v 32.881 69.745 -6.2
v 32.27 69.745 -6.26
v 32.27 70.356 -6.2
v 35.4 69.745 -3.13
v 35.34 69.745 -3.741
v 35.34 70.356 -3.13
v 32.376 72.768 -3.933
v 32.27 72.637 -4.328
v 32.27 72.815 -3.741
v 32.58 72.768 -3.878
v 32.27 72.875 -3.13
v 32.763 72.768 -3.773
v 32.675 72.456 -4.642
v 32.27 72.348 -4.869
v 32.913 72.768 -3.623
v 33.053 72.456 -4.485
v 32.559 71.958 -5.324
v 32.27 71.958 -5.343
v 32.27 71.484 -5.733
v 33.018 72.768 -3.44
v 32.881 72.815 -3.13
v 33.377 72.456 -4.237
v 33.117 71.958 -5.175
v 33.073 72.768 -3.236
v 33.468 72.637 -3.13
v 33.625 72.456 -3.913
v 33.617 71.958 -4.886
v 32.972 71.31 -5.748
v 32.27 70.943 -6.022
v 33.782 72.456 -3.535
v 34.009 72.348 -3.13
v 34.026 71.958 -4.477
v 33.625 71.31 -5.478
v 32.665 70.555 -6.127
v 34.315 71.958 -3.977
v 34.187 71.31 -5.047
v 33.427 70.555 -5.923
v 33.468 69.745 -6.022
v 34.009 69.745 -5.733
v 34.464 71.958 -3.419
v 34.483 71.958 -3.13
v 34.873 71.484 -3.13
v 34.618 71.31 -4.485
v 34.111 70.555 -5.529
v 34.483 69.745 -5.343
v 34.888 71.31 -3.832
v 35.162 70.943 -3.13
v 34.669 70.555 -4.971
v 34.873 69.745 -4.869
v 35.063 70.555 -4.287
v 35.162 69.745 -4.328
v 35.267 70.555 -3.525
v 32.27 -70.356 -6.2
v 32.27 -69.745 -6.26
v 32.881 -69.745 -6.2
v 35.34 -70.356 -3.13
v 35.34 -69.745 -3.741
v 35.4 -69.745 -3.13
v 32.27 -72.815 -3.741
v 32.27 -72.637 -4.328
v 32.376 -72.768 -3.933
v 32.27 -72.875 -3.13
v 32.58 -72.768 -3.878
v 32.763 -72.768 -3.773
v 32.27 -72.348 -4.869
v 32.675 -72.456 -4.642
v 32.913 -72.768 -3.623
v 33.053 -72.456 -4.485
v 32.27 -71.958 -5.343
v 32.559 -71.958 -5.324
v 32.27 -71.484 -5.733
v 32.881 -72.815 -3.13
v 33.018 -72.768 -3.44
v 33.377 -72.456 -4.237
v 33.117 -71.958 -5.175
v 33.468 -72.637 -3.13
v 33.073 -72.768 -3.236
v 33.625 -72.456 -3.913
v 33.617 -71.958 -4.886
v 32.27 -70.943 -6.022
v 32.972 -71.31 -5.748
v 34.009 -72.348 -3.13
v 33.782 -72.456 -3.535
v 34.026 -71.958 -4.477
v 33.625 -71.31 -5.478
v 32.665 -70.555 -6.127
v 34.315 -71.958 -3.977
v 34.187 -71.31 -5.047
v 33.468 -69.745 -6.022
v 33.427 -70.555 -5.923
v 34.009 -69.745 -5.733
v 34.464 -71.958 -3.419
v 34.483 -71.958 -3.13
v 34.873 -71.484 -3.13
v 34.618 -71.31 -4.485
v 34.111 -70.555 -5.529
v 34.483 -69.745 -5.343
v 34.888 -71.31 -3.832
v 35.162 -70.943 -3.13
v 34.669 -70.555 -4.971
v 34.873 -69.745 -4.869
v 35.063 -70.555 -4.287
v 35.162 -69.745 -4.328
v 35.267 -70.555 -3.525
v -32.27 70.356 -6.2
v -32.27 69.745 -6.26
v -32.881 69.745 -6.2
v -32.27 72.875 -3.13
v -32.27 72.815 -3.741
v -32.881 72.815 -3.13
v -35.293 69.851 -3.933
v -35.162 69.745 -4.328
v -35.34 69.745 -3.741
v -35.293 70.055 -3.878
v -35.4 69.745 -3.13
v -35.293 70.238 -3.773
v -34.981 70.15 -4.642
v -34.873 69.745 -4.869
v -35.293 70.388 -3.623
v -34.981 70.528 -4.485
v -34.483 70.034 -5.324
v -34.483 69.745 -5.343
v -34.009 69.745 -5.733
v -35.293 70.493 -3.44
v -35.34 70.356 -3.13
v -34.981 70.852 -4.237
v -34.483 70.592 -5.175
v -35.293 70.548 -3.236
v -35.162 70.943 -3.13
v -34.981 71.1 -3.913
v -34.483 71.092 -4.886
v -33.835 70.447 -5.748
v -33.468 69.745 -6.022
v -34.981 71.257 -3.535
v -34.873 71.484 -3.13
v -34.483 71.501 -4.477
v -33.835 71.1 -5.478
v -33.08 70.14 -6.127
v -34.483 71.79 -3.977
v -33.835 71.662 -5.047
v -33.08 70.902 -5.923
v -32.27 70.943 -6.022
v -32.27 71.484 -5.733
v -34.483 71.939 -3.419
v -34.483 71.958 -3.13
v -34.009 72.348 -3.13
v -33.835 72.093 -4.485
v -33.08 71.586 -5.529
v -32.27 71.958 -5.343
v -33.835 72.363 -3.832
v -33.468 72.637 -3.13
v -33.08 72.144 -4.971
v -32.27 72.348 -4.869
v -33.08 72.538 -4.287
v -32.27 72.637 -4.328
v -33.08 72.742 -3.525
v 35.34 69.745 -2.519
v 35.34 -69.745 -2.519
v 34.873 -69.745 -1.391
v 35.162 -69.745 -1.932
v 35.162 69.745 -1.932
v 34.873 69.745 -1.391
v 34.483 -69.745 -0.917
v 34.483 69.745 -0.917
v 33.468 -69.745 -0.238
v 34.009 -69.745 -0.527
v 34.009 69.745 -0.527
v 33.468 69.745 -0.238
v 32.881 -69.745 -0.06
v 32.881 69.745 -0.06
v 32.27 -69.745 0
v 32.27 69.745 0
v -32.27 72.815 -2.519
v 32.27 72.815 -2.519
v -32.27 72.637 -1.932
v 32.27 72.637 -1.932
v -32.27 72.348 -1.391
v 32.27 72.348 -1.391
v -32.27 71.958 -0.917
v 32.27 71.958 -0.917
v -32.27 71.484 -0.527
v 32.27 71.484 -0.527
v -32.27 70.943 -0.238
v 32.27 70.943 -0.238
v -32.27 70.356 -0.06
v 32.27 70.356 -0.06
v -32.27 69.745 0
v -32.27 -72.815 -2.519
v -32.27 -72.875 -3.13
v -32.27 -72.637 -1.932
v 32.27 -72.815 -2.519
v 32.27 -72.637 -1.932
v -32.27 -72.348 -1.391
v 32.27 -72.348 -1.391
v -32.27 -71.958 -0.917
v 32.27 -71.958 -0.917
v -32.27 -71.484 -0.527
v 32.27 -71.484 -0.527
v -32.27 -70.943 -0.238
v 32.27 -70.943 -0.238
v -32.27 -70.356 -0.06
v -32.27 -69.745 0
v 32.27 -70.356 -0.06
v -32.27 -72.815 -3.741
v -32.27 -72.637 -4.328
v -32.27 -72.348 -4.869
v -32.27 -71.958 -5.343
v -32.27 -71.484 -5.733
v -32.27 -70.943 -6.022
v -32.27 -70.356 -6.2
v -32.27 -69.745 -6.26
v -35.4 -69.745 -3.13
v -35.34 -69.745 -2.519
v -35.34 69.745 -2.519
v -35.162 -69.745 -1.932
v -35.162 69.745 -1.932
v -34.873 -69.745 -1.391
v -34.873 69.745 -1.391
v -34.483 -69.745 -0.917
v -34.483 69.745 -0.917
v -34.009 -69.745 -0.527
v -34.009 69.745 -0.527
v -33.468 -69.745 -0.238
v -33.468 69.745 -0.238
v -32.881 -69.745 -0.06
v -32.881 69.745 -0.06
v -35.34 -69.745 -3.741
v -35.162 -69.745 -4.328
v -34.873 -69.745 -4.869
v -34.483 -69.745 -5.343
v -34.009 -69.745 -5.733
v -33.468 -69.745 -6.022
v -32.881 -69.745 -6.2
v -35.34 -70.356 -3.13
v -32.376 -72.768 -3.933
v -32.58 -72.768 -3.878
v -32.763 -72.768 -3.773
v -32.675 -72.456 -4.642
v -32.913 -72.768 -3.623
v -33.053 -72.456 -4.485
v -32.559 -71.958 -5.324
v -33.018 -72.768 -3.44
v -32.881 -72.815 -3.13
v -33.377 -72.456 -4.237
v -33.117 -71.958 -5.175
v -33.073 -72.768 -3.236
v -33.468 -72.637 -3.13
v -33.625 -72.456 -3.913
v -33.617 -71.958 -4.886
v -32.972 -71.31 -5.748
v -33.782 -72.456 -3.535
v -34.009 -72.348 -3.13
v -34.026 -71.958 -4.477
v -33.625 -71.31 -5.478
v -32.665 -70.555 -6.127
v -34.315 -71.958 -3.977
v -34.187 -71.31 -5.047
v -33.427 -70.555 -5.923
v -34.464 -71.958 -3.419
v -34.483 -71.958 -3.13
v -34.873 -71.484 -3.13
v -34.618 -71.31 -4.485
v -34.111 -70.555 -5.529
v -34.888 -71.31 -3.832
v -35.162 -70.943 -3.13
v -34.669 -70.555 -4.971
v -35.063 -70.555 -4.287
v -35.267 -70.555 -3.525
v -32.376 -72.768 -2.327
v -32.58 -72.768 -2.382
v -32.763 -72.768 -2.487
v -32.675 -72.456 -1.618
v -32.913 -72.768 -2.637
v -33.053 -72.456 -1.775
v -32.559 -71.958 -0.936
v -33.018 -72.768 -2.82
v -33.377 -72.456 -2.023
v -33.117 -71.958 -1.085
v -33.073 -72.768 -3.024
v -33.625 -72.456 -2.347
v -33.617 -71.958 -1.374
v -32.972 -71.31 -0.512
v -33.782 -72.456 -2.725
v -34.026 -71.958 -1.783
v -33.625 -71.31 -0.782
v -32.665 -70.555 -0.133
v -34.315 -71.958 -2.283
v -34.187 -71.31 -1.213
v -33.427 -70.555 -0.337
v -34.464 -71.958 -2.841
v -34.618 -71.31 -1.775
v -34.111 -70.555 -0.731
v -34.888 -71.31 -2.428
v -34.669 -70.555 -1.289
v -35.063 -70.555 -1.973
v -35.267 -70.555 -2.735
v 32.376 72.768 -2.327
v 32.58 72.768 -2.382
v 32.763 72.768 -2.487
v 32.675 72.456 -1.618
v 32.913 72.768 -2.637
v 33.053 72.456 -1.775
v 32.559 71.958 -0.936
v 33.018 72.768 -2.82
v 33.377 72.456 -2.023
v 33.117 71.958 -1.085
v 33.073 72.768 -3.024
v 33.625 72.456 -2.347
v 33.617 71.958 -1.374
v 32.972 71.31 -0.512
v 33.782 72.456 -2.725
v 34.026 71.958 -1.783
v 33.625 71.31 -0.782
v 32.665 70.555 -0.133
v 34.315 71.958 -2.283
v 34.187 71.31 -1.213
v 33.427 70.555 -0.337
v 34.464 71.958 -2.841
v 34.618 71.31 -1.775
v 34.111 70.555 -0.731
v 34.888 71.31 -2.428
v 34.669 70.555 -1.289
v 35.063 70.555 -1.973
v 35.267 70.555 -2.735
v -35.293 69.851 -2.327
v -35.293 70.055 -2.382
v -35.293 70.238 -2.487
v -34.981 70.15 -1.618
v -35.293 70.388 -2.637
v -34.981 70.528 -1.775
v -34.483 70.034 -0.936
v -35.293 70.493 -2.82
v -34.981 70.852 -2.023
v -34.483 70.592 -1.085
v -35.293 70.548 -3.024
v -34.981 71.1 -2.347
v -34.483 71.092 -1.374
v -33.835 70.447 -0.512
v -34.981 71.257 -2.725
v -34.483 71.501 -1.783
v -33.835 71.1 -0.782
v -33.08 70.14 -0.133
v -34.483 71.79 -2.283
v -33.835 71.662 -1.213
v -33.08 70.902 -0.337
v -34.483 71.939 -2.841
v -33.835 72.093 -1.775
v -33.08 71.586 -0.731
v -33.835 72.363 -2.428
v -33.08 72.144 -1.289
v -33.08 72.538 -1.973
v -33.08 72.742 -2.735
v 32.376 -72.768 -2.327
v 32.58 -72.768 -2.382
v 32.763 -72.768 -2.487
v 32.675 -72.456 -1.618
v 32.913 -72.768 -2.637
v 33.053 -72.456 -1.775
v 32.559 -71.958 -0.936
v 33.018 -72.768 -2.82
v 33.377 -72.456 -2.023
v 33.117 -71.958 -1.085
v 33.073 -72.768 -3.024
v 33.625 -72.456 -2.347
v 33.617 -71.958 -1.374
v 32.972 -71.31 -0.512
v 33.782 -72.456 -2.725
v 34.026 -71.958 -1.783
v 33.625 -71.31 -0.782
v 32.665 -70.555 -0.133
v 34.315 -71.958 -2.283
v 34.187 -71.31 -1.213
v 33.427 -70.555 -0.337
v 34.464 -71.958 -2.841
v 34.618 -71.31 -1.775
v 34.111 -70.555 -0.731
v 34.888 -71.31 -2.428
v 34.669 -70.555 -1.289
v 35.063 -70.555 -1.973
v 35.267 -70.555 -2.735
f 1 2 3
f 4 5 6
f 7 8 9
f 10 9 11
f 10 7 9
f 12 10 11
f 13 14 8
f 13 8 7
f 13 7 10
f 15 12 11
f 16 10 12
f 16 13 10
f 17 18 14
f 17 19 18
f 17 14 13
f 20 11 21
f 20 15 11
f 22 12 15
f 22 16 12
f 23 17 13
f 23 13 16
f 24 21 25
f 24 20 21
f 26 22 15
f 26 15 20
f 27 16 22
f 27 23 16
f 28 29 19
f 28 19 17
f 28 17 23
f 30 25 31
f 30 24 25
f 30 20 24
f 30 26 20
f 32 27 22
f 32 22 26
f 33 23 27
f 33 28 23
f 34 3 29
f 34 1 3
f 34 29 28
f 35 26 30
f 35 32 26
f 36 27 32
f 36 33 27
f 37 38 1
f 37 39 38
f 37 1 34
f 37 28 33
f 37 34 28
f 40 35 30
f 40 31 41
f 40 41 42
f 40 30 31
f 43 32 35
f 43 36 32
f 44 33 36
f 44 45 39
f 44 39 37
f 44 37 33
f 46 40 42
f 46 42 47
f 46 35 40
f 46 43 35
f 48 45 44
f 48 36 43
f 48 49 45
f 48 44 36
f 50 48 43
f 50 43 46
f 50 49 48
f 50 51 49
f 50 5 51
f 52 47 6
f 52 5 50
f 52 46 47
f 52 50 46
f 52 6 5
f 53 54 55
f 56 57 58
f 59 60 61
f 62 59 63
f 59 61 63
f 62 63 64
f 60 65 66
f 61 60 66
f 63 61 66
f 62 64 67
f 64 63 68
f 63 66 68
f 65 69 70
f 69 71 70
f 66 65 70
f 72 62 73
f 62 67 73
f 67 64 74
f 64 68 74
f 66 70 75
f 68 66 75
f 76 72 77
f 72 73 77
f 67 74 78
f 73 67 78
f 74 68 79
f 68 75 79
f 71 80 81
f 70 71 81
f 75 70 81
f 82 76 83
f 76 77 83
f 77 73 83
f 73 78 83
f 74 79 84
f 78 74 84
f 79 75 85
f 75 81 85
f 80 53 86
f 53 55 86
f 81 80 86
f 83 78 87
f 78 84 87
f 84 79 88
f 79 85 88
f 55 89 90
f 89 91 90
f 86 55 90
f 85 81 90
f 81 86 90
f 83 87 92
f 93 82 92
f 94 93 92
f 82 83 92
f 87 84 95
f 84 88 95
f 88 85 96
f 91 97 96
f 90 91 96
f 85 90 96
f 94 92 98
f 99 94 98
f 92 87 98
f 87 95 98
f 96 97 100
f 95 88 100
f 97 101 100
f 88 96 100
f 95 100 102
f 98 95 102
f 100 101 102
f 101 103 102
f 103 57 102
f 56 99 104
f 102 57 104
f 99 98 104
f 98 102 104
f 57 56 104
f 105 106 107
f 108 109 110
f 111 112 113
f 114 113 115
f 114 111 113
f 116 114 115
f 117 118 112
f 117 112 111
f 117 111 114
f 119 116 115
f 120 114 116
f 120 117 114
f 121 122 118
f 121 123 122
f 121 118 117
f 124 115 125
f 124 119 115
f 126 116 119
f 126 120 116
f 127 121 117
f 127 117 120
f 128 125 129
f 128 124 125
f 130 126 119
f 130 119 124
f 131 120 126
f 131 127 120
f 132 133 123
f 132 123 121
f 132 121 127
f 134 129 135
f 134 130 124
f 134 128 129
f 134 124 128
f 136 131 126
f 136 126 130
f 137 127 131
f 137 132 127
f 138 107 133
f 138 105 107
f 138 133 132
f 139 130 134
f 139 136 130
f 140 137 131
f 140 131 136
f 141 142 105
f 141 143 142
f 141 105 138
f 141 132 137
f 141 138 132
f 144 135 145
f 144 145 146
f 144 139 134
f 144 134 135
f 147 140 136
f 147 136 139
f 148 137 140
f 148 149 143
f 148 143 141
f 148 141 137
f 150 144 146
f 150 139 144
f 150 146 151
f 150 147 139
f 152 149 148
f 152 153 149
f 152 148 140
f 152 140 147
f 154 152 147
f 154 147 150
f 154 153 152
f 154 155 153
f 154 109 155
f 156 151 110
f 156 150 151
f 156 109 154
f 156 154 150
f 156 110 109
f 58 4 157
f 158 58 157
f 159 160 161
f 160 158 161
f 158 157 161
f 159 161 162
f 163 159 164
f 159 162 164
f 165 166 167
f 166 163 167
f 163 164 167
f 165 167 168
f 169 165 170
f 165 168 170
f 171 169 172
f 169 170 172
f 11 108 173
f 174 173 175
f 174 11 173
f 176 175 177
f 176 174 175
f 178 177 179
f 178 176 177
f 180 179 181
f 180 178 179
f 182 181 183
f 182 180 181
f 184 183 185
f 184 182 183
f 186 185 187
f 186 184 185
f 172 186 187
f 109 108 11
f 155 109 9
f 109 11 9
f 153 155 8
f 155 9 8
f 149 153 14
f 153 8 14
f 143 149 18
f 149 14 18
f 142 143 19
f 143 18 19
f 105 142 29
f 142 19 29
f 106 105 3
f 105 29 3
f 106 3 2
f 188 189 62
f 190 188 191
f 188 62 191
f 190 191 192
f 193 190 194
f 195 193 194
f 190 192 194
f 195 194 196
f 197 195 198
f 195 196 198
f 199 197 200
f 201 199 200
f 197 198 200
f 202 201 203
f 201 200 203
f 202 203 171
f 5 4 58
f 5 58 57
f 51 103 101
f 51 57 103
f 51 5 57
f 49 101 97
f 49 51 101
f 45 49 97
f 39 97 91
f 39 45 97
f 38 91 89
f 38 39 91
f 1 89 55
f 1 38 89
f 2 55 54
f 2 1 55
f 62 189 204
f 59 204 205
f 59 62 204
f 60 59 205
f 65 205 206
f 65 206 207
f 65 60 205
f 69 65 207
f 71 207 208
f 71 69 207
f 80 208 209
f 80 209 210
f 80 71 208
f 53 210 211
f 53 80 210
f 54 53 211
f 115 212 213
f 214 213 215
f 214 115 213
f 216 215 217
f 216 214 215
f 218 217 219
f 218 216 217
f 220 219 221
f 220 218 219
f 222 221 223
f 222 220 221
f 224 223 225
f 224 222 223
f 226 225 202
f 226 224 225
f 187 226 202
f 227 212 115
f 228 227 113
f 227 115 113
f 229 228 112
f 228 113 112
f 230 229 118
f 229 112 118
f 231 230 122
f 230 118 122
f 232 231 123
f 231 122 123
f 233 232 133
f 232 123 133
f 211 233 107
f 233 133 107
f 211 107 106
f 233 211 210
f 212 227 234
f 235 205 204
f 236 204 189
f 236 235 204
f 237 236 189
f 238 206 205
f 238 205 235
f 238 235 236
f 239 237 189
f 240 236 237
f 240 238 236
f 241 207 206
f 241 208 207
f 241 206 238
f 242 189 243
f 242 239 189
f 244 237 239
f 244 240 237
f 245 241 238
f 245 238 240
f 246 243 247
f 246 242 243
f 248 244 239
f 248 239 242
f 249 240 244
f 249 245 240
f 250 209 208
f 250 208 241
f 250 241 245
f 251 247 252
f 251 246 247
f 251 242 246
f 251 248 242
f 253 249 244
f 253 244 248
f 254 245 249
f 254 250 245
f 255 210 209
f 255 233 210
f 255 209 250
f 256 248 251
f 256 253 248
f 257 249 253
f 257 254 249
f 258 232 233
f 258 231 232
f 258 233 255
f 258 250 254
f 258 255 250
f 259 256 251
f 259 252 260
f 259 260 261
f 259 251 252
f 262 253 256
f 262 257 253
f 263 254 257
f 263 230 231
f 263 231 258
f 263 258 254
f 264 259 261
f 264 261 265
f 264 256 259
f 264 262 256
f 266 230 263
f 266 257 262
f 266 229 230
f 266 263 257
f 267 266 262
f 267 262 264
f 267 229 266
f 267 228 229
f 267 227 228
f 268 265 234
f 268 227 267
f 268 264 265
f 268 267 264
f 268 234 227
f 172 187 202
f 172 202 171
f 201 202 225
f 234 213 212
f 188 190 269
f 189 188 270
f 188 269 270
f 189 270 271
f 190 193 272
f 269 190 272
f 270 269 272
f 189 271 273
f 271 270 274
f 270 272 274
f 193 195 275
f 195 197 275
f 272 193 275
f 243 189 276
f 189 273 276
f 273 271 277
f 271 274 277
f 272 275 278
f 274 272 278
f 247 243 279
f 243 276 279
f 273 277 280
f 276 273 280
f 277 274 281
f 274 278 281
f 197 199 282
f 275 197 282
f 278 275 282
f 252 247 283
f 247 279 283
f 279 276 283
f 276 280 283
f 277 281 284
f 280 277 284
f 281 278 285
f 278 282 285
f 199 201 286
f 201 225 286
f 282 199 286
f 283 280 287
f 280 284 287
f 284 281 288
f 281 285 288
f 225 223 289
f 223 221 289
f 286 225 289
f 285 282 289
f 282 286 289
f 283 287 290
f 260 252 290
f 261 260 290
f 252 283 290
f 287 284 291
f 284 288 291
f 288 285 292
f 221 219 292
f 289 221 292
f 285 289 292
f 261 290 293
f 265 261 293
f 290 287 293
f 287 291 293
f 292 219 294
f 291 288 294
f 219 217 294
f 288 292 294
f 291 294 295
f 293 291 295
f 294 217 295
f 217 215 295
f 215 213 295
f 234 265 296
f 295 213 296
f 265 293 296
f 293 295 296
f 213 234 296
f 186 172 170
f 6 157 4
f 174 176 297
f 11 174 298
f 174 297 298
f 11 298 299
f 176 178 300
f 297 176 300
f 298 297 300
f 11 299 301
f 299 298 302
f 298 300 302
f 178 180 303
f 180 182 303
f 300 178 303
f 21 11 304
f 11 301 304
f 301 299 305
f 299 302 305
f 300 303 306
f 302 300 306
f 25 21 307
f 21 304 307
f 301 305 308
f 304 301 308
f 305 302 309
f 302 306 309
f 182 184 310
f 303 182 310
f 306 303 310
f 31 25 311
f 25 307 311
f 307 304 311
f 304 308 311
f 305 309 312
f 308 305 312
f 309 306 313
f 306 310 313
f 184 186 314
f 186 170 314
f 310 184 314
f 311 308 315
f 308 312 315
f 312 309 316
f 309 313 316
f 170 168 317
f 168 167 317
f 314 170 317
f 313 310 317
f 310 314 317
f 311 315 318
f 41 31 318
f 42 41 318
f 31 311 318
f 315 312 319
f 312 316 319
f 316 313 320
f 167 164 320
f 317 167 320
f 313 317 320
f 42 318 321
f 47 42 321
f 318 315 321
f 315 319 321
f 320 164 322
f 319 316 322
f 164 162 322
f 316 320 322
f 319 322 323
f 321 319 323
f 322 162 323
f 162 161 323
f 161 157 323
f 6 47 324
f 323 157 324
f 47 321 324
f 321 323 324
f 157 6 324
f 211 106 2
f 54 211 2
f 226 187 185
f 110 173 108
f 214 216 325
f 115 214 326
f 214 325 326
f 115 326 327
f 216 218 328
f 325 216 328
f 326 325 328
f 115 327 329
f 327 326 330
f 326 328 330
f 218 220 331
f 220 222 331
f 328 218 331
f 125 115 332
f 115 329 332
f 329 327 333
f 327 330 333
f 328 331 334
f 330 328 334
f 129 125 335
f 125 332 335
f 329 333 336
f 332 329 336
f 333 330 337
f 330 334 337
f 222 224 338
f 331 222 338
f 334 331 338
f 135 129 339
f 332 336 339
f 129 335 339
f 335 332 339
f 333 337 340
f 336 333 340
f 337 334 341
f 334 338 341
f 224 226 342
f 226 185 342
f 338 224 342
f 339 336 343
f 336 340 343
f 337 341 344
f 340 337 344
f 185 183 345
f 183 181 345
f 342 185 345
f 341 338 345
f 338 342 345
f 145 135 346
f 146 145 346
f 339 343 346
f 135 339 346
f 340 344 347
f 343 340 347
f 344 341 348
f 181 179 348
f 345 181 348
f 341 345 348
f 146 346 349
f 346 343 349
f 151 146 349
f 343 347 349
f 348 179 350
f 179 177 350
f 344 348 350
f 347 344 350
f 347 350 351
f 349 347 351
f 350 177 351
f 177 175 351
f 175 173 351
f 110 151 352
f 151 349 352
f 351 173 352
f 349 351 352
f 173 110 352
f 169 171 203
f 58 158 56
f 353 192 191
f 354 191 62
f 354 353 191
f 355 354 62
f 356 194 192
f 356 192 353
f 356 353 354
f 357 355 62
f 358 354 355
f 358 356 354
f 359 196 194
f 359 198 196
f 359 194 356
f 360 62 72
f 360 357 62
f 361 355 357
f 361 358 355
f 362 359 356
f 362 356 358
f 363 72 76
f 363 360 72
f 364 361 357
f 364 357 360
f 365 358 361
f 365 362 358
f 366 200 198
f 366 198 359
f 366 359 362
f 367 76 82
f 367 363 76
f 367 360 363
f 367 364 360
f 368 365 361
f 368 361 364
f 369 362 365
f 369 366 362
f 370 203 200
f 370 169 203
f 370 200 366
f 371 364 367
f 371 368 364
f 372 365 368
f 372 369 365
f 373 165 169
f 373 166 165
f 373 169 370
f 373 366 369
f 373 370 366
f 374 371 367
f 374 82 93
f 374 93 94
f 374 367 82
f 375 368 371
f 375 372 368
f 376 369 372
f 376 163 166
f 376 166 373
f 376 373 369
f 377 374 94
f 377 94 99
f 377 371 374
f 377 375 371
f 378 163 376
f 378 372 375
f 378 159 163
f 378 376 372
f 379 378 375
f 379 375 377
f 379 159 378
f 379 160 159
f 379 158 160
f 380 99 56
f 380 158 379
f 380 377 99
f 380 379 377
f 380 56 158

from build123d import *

# Parameters (mm, degrees)
F0_W     = 70.8
F0_H     = 145.75
F1_DEPTH = 6.26
F2_R     = 3.12999


# Not quite as in the source:
# - a fillet or chamfer is up to 0.001 mm smaller than in the source, because OpenCascade refuses the exact size


with BuildPart() as f1:
    # F0 (on Top) → F1 (new body)
    with BuildSketch(Plane.XY):
        Rectangle(F0_W, F0_H)
        with BuildLine():
            Line((-34.9, -69.245), (-34.9, 69.245))
            ThreePointArc((-34.9, 69.245), (-33.9832442251, 71.4582442251), (-31.77, 72.375))
            Line((-31.77, 72.375), (31.77, 72.375))
            ThreePointArc((31.77, 72.375), (33.9832442251, 71.4582442251), (34.9, 69.245))
            Line((34.9, 69.245), (34.9, -69.245))
            ThreePointArc((34.9, -69.245), (33.9832442251, -71.4582442251), (31.77, -72.375))
            Line((31.77, -72.375), (-31.77, -72.375))
            ThreePointArc((-31.77, -72.375), (-33.9832442251, -71.4582442251), (-34.9, -69.245))
        make_face(mode=Mode.SUBTRACT)
        with BuildLine():
            ThreePointArc((-31.77, 72.375), (-33.9832442251, 71.4582442251), (-34.9, 69.245))
            Line((-34.9, 69.245), (-34.9, -69.245))
            ThreePointArc((-34.9, -69.245), (-33.9832442251, -71.4582442251), (-31.77, -72.375))
            Line((-31.77, -72.375), (31.77, -72.375))
            ThreePointArc((31.77, -72.375), (33.9832442251, -71.4582442251), (34.9, -69.245))
            Line((34.9, -69.245), (34.9, 69.245))
            ThreePointArc((34.9, 69.245), (33.9832442251, 71.4582442251), (31.77, 72.375))
            Line((31.77, 72.375), (-31.77, 72.375))
        make_face()
    extrude(amount=-F1_DEPTH)

    # F2 (radius 3.13 in the source; OpenCascade refuses exactly that, so slightly less here)
    f2_edges = [f1.edges().sort_by_distance(p)[0] for p in [
        (35.4, 0, 0),
        (0, 72.875, 0),
        (-35.4, 0, 0),
        (0, -72.875, 0),
        (35.4, 0, -6.26),
        (0, 72.875, -6.26),
        (-35.4, 0, -6.26),
        (0, -72.875, -6.26),
        (35.4, -72.875, -3.13),
        (-35.4, -72.875, -3.13),
        (-35.4, 72.875, -3.13),
        (35.4, 72.875, -3.13),
    ]]
    fillet(f2_edges, radius=F2_R)


solid = f1.part
